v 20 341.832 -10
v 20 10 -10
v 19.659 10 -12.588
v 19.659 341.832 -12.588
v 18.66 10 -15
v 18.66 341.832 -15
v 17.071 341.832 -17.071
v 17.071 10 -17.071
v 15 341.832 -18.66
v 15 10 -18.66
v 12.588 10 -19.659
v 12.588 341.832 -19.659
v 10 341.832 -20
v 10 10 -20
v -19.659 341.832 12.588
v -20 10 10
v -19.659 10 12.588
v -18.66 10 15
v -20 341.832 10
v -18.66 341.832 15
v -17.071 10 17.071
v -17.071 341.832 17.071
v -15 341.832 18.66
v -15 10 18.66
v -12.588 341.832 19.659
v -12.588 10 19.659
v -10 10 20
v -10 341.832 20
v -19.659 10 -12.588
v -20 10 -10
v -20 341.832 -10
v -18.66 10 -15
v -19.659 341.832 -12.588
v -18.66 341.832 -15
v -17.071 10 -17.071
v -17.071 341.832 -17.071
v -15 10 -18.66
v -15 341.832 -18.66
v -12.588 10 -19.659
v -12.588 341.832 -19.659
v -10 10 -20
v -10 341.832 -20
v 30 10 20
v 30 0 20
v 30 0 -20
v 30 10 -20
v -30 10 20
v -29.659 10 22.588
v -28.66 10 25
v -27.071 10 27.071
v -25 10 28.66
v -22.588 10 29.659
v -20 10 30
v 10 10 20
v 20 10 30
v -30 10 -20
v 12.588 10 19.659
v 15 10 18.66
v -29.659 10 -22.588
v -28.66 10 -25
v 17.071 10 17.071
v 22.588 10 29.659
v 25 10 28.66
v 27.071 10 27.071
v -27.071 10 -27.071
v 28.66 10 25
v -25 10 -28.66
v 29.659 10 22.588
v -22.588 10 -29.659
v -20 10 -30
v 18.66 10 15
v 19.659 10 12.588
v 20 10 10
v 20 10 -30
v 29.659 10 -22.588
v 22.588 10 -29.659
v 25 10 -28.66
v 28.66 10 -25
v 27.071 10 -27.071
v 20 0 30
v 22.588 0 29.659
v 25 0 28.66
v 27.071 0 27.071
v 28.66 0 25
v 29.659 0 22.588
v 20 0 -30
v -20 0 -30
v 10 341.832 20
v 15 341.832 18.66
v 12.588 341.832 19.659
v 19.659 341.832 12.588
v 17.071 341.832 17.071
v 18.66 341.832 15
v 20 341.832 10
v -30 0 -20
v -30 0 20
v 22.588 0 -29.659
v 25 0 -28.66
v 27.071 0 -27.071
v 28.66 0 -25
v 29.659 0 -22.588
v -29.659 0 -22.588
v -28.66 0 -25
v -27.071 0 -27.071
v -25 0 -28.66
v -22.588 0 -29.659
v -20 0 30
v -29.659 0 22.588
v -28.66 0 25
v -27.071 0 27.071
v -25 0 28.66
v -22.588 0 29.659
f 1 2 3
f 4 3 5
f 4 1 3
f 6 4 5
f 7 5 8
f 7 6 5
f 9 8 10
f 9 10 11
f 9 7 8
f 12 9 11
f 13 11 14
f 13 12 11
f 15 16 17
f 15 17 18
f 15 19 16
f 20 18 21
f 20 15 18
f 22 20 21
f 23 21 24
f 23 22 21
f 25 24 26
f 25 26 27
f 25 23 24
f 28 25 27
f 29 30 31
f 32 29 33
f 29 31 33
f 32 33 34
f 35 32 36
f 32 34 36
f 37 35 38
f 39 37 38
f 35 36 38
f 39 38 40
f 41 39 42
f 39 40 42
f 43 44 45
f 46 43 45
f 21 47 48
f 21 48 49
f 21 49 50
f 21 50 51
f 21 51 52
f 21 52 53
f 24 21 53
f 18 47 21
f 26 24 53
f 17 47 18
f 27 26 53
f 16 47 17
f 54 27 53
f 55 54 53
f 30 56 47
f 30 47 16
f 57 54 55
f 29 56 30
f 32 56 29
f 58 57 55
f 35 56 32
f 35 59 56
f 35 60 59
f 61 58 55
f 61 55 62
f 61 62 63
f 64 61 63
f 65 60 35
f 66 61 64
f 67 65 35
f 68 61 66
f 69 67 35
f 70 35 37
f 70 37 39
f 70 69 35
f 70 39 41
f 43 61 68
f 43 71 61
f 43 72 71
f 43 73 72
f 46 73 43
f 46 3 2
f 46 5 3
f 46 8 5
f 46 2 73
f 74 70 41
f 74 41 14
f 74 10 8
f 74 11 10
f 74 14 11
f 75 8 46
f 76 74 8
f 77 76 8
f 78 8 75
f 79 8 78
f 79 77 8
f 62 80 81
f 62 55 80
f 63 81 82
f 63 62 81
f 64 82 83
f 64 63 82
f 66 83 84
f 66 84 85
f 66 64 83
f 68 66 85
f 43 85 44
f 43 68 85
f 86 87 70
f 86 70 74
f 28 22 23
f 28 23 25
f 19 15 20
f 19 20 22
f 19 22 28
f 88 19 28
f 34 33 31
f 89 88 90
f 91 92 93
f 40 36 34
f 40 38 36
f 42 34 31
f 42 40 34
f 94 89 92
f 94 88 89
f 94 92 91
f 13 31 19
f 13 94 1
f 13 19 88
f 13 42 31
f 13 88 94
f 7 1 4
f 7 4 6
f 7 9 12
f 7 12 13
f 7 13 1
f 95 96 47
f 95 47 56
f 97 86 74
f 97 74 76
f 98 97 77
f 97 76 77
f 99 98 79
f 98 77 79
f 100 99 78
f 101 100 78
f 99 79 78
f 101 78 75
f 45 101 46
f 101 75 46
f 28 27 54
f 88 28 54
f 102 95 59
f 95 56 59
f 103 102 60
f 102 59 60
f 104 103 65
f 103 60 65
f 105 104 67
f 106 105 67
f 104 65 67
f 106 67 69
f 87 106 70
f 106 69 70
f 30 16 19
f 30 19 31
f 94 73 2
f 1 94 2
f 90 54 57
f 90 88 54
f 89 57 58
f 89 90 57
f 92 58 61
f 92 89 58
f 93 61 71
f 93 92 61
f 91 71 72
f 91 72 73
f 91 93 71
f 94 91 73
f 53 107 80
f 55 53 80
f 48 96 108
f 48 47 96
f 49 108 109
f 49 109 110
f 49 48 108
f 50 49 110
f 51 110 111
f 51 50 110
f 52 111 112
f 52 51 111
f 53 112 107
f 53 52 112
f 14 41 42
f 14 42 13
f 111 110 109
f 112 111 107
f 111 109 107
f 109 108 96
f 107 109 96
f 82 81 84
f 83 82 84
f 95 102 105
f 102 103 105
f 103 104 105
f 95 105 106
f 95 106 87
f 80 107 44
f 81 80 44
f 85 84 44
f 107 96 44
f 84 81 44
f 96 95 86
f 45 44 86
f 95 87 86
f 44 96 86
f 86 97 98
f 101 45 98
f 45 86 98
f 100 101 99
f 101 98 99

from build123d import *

# Parameters (mm, degrees)
SKETCH1_W           = 60
SKETCH1_H           = 60
BOSS_EXTRUDE1_DEPTH = 10
SKETCH2_W           = 40
SKETCH2_H           = 40
BOSS_EXTRUDE2_DEPTH = 341.83195
FILLET1_R           = 10


with BuildPart() as part:
    # Sketch1 → Boss-Extrude1 (new body)
    with BuildSketch(Plane(origin=(0, 0, 0), x_dir=(1, 0, 0), z_dir=(0, 1, 0))):
        Rectangle(SKETCH1_W, SKETCH1_H)
    extrude(amount=BOSS_EXTRUDE1_DEPTH)

    # Sketch2 → Boss-Extrude2 (add)
    with BuildSketch(Plane(origin=(0, 0, 0), x_dir=(1, 0, 0), z_dir=(0, 1, 0))):
        Rectangle(SKETCH2_W, SKETCH2_H)
    extrude(amount=BOSS_EXTRUDE2_DEPTH)

    # Fillet1
    fillet1_edges = [part.edges().sort_by_distance(p)[0] for p in [
        (20, 175.915975, 20),
        (20, 175.915975, -20),
        (-20, 175.915975, -20),
        (-20, 175.915975, 20),
        (30, 5, 30),
        (-30, 5, 30),
        (-30, 5, -30),
        (30, 5, -30),
    ]]
    fillet(fillet1_edges, radius=FILLET1_R)


solid = part.part
